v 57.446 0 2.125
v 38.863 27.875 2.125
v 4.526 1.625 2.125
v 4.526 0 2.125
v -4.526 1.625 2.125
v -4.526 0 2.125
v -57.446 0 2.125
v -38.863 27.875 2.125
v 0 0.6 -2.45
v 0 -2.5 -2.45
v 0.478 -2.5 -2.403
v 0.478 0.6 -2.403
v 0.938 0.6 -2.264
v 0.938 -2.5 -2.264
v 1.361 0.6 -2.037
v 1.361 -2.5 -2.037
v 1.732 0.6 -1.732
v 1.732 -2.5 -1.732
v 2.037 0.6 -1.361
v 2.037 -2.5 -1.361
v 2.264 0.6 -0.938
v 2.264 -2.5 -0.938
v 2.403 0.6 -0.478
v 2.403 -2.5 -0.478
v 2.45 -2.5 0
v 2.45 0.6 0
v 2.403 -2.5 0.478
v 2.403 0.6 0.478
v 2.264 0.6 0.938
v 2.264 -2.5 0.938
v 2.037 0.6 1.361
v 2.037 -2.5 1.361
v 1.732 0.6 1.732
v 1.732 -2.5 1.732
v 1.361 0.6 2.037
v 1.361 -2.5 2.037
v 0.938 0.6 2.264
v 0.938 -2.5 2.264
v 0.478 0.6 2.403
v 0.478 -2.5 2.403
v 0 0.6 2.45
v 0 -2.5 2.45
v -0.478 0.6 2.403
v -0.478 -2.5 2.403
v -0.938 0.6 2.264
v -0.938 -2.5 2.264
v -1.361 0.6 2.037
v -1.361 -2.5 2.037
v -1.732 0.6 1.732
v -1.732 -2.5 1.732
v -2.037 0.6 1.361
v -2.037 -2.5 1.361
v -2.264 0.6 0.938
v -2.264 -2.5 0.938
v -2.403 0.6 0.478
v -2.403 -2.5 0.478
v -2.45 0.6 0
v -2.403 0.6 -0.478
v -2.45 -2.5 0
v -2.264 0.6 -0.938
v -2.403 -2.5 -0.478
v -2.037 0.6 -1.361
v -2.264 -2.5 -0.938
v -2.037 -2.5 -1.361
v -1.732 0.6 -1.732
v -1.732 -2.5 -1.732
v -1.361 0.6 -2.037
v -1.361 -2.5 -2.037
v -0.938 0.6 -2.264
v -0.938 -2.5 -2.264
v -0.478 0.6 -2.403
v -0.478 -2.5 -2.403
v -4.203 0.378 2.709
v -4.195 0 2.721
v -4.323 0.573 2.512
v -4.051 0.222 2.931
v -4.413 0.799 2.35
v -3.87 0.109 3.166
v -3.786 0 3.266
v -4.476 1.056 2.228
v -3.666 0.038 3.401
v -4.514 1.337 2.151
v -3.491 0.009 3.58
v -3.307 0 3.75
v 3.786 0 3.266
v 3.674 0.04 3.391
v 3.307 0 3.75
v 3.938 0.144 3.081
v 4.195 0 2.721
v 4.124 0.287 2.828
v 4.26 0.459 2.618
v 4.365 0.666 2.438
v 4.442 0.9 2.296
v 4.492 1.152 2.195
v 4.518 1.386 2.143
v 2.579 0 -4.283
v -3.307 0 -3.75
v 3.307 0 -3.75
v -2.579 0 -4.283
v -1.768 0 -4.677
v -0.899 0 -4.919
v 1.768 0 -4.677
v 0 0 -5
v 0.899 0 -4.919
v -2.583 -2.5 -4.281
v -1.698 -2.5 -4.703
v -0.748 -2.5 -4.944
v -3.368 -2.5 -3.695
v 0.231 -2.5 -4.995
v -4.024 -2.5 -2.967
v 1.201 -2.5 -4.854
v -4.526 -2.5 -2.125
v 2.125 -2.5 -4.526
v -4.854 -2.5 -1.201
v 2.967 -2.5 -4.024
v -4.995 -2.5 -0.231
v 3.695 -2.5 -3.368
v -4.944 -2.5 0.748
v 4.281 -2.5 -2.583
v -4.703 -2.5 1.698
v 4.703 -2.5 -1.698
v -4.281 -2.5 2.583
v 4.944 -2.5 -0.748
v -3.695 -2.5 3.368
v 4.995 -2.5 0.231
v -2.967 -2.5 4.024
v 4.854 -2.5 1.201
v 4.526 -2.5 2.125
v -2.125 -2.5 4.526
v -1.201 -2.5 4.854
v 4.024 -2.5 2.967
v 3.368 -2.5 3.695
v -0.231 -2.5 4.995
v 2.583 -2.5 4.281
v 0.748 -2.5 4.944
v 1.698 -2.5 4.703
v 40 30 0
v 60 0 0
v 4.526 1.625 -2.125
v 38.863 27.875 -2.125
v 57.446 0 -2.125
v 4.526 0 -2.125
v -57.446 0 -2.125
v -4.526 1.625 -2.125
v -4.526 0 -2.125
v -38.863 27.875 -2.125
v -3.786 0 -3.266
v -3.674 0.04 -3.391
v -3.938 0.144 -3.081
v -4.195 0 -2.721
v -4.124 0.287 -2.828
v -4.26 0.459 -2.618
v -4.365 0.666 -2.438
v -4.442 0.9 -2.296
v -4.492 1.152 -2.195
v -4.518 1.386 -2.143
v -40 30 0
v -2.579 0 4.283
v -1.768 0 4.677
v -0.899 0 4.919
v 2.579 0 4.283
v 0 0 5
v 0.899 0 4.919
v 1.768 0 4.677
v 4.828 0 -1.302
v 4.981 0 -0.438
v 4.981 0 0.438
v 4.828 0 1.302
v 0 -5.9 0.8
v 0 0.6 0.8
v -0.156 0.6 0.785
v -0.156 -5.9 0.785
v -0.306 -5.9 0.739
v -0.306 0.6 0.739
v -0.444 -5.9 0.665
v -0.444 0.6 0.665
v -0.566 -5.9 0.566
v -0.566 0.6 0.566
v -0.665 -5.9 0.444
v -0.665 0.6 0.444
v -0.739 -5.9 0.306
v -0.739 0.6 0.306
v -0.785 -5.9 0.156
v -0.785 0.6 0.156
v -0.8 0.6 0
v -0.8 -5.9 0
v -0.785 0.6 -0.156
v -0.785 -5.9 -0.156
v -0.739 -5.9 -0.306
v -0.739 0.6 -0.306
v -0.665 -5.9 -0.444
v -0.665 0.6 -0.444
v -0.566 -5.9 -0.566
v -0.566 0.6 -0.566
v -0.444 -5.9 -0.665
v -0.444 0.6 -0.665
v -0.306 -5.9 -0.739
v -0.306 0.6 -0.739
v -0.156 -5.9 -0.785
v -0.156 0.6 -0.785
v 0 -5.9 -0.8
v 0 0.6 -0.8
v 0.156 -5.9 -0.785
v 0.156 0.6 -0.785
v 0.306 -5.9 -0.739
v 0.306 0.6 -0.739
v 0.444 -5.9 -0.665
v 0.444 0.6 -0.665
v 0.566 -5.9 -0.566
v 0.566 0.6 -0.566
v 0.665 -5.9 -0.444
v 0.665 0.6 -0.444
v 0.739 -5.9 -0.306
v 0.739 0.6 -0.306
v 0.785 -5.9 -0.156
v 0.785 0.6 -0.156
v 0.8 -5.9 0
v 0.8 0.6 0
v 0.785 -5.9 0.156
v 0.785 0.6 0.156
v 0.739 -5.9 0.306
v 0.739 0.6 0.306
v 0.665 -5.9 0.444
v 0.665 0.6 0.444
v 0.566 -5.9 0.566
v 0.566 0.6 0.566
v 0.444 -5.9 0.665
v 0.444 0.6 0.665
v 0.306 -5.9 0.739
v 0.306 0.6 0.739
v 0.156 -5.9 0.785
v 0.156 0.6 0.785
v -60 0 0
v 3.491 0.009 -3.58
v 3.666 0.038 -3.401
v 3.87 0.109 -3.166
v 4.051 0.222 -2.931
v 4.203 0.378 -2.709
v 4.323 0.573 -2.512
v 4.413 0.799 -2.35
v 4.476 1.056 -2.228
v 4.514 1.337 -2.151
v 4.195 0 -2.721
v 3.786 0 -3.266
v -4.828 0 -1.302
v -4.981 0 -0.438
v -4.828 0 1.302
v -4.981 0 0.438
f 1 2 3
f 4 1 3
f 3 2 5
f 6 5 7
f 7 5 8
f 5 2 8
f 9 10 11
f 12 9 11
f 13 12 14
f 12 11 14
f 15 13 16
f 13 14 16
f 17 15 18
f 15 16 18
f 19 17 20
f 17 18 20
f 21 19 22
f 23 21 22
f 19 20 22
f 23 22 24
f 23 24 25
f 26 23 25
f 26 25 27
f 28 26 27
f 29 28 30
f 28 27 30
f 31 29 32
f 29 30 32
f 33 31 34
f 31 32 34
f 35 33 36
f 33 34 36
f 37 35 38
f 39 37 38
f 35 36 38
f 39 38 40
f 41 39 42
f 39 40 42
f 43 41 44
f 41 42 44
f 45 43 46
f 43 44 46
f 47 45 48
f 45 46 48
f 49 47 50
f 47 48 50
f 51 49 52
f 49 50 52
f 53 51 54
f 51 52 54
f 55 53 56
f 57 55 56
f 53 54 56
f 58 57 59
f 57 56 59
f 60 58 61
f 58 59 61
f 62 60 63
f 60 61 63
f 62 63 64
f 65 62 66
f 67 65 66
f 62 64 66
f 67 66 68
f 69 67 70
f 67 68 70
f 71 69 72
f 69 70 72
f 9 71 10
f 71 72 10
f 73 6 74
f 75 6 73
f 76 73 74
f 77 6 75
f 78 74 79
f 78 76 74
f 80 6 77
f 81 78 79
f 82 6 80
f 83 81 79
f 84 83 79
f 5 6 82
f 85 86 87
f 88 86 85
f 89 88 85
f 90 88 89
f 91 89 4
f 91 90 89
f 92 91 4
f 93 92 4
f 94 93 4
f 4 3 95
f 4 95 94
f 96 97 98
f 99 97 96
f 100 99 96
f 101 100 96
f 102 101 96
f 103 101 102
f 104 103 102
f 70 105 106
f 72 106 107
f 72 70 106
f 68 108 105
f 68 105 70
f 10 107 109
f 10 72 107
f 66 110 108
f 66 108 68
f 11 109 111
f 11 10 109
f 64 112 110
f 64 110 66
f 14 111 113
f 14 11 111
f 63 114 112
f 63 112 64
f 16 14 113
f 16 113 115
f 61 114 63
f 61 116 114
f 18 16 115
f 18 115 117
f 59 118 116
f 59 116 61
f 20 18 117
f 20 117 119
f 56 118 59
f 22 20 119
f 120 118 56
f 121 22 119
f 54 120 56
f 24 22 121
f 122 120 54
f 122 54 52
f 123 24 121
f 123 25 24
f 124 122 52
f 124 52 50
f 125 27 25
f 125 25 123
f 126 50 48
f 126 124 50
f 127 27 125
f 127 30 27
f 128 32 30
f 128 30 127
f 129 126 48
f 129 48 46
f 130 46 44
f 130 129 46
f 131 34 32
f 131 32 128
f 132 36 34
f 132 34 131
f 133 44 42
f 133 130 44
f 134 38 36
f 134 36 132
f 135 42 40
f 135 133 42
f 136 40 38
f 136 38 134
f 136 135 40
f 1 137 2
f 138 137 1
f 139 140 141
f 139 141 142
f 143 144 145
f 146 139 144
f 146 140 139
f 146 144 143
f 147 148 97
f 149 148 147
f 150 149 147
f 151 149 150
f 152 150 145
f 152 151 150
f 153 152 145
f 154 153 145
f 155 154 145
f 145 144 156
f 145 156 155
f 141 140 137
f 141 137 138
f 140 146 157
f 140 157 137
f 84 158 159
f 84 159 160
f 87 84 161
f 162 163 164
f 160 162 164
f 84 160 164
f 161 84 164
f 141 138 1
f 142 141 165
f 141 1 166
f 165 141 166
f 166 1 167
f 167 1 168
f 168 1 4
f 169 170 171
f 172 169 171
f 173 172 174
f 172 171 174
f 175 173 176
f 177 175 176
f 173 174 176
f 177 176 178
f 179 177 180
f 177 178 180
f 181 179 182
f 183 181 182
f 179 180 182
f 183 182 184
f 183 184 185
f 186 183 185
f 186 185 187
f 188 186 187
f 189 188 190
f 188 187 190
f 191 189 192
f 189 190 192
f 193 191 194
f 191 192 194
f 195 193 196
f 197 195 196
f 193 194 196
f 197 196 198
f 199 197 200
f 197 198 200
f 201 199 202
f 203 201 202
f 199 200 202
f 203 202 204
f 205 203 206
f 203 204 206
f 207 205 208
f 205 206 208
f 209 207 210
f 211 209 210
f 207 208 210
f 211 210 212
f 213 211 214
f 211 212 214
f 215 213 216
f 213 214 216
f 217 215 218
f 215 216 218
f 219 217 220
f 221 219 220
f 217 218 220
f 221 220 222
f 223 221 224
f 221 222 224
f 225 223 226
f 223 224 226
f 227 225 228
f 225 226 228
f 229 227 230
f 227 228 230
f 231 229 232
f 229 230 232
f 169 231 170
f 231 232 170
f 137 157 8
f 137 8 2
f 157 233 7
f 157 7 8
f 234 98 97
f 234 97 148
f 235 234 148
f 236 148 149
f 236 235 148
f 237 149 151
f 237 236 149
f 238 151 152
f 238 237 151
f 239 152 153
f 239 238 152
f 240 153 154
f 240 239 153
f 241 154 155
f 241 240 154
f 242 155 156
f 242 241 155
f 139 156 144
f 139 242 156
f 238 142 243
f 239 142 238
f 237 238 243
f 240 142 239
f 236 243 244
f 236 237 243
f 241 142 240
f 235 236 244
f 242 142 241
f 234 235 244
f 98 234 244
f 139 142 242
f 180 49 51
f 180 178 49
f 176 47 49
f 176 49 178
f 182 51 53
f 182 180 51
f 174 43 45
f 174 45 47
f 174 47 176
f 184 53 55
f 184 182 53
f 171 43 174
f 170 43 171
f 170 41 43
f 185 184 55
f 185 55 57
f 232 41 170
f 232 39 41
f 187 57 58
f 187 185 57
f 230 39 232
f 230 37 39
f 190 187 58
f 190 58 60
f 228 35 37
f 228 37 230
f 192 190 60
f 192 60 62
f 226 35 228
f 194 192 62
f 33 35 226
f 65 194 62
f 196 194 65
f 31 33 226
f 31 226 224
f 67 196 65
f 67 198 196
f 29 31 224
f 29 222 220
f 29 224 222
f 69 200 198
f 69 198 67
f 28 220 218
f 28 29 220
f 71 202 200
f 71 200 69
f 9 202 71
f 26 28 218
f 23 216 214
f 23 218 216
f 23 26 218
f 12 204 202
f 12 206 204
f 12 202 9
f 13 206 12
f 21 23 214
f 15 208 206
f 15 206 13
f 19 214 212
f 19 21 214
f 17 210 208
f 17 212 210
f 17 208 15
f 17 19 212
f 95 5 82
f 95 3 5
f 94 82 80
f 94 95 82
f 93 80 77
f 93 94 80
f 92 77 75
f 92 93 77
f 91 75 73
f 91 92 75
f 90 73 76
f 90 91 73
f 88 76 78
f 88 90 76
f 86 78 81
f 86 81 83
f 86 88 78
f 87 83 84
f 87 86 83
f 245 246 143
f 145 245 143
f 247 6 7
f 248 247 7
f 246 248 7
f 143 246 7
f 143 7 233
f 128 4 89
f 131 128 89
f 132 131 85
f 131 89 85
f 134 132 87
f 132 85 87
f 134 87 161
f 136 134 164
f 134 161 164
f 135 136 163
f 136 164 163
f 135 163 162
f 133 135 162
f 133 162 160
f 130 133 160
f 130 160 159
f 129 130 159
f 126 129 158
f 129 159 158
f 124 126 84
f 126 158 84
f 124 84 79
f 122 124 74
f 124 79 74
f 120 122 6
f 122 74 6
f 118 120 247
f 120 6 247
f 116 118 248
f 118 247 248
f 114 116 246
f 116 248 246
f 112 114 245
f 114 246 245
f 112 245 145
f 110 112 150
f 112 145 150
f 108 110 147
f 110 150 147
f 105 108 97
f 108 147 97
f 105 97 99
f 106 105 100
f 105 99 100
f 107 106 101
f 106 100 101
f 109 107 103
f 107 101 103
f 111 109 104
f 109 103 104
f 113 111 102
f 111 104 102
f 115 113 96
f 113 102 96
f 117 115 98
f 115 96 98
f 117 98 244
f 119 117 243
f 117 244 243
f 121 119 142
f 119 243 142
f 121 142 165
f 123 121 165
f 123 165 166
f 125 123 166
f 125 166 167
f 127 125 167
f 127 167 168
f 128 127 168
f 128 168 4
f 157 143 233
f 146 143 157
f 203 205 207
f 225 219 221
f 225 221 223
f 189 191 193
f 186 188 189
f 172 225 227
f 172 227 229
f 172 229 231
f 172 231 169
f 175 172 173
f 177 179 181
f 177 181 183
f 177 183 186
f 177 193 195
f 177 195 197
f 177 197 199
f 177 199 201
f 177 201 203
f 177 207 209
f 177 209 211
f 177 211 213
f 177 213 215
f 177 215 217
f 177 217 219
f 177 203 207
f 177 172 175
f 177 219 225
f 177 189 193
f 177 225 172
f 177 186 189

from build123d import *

# Parameters (mm, degrees)
SALIENTE_EXTRUIR1_DEPTH = 2.125
CROQUIS2_R              = 5
SALIENTE_EXTRUIR2_DEPTH = 2.5
REDONDEO1_R             = 1.625
SKETCH1_R               = 2.45
CUT_EXTRUDE1_DEPTH      = 3.1
CHAMFER1_SIZE           = 2.125
CROQUIS3_R              = 0.8
SALIENTE_EXTRUIR3_DEPTH = 6.5


# Some blends are built 0.0001 mm under size
with BuildPart() as part:
    # Croquis1 → Saliente-Extruir1 (new, symmetric)
    with BuildSketch(Plane.XY):
        Polygon((60, 0), (-60, 0), (-40, 30), (40, 30), align=None)
    extrude(amount=SALIENTE_EXTRUIR1_DEPTH, both=True)

    # Croquis2 → Saliente-Extruir2 (add)
    with BuildSketch(Plane.XZ):
        with Locations(Location((0, 0, 0), (0, 0, 25.150663413))):
            Circle(CROQUIS2_R)
    extrude(amount=SALIENTE_EXTRUIR2_DEPTH)

    # Redondeo1
    # the kernel refuses this fillet: 1.625 mm, written as the material it adds along each edge
    with BuildSketch(Plane(origin=(8.588466748, 0, -2.125), x_dir=(0, 1, 0), z_dir=(-1, 0, 0))) as redondeo1_piece_1_section:
        with BuildLine():
            CenterArc((REDONDEO1_R, REDONDEO1_R), REDONDEO1_R, 180, 90)
            Line((0, REDONDEO1_R), (0, 0))
            Line((0, 0), (REDONDEO1_R, 0))
        make_face()
    redondeo1_piece_1 = extrude(amount=17.176933495, mode=Mode.PRIVATE)
    redondeo1_piece_1 = redondeo1_piece_1 & Plane(origin=(0, 0.370660795, 0), x_dir=(0.9051933495081991, 0, 0.4250000000072087), z_dir=(0, 1, 0)) * Cylinder(5, 41, mode=Mode.PRIVATE)
    add(redondeo1_piece_1)
    with BuildSketch(Plane(origin=(8.588466748, 0, 2.125), x_dir=(0, 1, 0), z_dir=(-1, 0, 0))) as redondeo1_piece_2_section:
        with BuildLine():
            CenterArc((REDONDEO1_R, -REDONDEO1_R), REDONDEO1_R, 90, 90)
            Line((0, -REDONDEO1_R), (0, 0))
            Line((0, 0), (REDONDEO1_R, 0))
        make_face()
    redondeo1_piece_2 = extrude(amount=17.176933495, mode=Mode.PRIVATE)
    redondeo1_piece_2 = redondeo1_piece_2 & Plane(origin=(0, 0.370660827, 0), x_dir=(0.9051933495081991, 0, 0.4250000000072087), z_dir=(0, 1, 0)) * Cylinder(5, 41, mode=Mode.PRIVATE)
    add(redondeo1_piece_2)

    # Sketch1 → Cut-Extrude1 (cut)
    with BuildSketch(Plane.XZ.offset(2.5)):
        with Locations(Location((0, 0, 0), (0, 0, 270))):
            Circle(SKETCH1_R)
    extrude(amount=-CUT_EXTRUDE1_DEPTH, mode=Mode.SUBTRACT)

    # Chamfer1
    chamfer1_edges = [part.edges().sort_by_distance(p)[0] for p in [
        (50, 15, -2.125),
        (0, 30, -2.125),
        (-50, 15, -2.125),
        (50, 15, 2.125),
        (0, 30, 2.125),
        (-50, 15, 2.125),
    ]]
    chamfer(chamfer1_edges, length=CHAMFER1_SIZE - 0.0001)  # a hair under: the kernel refuses the full size

    # Croquis3 → Saliente-Extruir3 (add)
    with BuildSketch(Plane.XZ.offset(-0.6)):
        with Locations(Location((0, 0, 0), (0, 0, 90))):
            Circle(CROQUIS3_R)
    extrude(amount=SALIENTE_EXTRUIR3_DEPTH)


solid = part.part
